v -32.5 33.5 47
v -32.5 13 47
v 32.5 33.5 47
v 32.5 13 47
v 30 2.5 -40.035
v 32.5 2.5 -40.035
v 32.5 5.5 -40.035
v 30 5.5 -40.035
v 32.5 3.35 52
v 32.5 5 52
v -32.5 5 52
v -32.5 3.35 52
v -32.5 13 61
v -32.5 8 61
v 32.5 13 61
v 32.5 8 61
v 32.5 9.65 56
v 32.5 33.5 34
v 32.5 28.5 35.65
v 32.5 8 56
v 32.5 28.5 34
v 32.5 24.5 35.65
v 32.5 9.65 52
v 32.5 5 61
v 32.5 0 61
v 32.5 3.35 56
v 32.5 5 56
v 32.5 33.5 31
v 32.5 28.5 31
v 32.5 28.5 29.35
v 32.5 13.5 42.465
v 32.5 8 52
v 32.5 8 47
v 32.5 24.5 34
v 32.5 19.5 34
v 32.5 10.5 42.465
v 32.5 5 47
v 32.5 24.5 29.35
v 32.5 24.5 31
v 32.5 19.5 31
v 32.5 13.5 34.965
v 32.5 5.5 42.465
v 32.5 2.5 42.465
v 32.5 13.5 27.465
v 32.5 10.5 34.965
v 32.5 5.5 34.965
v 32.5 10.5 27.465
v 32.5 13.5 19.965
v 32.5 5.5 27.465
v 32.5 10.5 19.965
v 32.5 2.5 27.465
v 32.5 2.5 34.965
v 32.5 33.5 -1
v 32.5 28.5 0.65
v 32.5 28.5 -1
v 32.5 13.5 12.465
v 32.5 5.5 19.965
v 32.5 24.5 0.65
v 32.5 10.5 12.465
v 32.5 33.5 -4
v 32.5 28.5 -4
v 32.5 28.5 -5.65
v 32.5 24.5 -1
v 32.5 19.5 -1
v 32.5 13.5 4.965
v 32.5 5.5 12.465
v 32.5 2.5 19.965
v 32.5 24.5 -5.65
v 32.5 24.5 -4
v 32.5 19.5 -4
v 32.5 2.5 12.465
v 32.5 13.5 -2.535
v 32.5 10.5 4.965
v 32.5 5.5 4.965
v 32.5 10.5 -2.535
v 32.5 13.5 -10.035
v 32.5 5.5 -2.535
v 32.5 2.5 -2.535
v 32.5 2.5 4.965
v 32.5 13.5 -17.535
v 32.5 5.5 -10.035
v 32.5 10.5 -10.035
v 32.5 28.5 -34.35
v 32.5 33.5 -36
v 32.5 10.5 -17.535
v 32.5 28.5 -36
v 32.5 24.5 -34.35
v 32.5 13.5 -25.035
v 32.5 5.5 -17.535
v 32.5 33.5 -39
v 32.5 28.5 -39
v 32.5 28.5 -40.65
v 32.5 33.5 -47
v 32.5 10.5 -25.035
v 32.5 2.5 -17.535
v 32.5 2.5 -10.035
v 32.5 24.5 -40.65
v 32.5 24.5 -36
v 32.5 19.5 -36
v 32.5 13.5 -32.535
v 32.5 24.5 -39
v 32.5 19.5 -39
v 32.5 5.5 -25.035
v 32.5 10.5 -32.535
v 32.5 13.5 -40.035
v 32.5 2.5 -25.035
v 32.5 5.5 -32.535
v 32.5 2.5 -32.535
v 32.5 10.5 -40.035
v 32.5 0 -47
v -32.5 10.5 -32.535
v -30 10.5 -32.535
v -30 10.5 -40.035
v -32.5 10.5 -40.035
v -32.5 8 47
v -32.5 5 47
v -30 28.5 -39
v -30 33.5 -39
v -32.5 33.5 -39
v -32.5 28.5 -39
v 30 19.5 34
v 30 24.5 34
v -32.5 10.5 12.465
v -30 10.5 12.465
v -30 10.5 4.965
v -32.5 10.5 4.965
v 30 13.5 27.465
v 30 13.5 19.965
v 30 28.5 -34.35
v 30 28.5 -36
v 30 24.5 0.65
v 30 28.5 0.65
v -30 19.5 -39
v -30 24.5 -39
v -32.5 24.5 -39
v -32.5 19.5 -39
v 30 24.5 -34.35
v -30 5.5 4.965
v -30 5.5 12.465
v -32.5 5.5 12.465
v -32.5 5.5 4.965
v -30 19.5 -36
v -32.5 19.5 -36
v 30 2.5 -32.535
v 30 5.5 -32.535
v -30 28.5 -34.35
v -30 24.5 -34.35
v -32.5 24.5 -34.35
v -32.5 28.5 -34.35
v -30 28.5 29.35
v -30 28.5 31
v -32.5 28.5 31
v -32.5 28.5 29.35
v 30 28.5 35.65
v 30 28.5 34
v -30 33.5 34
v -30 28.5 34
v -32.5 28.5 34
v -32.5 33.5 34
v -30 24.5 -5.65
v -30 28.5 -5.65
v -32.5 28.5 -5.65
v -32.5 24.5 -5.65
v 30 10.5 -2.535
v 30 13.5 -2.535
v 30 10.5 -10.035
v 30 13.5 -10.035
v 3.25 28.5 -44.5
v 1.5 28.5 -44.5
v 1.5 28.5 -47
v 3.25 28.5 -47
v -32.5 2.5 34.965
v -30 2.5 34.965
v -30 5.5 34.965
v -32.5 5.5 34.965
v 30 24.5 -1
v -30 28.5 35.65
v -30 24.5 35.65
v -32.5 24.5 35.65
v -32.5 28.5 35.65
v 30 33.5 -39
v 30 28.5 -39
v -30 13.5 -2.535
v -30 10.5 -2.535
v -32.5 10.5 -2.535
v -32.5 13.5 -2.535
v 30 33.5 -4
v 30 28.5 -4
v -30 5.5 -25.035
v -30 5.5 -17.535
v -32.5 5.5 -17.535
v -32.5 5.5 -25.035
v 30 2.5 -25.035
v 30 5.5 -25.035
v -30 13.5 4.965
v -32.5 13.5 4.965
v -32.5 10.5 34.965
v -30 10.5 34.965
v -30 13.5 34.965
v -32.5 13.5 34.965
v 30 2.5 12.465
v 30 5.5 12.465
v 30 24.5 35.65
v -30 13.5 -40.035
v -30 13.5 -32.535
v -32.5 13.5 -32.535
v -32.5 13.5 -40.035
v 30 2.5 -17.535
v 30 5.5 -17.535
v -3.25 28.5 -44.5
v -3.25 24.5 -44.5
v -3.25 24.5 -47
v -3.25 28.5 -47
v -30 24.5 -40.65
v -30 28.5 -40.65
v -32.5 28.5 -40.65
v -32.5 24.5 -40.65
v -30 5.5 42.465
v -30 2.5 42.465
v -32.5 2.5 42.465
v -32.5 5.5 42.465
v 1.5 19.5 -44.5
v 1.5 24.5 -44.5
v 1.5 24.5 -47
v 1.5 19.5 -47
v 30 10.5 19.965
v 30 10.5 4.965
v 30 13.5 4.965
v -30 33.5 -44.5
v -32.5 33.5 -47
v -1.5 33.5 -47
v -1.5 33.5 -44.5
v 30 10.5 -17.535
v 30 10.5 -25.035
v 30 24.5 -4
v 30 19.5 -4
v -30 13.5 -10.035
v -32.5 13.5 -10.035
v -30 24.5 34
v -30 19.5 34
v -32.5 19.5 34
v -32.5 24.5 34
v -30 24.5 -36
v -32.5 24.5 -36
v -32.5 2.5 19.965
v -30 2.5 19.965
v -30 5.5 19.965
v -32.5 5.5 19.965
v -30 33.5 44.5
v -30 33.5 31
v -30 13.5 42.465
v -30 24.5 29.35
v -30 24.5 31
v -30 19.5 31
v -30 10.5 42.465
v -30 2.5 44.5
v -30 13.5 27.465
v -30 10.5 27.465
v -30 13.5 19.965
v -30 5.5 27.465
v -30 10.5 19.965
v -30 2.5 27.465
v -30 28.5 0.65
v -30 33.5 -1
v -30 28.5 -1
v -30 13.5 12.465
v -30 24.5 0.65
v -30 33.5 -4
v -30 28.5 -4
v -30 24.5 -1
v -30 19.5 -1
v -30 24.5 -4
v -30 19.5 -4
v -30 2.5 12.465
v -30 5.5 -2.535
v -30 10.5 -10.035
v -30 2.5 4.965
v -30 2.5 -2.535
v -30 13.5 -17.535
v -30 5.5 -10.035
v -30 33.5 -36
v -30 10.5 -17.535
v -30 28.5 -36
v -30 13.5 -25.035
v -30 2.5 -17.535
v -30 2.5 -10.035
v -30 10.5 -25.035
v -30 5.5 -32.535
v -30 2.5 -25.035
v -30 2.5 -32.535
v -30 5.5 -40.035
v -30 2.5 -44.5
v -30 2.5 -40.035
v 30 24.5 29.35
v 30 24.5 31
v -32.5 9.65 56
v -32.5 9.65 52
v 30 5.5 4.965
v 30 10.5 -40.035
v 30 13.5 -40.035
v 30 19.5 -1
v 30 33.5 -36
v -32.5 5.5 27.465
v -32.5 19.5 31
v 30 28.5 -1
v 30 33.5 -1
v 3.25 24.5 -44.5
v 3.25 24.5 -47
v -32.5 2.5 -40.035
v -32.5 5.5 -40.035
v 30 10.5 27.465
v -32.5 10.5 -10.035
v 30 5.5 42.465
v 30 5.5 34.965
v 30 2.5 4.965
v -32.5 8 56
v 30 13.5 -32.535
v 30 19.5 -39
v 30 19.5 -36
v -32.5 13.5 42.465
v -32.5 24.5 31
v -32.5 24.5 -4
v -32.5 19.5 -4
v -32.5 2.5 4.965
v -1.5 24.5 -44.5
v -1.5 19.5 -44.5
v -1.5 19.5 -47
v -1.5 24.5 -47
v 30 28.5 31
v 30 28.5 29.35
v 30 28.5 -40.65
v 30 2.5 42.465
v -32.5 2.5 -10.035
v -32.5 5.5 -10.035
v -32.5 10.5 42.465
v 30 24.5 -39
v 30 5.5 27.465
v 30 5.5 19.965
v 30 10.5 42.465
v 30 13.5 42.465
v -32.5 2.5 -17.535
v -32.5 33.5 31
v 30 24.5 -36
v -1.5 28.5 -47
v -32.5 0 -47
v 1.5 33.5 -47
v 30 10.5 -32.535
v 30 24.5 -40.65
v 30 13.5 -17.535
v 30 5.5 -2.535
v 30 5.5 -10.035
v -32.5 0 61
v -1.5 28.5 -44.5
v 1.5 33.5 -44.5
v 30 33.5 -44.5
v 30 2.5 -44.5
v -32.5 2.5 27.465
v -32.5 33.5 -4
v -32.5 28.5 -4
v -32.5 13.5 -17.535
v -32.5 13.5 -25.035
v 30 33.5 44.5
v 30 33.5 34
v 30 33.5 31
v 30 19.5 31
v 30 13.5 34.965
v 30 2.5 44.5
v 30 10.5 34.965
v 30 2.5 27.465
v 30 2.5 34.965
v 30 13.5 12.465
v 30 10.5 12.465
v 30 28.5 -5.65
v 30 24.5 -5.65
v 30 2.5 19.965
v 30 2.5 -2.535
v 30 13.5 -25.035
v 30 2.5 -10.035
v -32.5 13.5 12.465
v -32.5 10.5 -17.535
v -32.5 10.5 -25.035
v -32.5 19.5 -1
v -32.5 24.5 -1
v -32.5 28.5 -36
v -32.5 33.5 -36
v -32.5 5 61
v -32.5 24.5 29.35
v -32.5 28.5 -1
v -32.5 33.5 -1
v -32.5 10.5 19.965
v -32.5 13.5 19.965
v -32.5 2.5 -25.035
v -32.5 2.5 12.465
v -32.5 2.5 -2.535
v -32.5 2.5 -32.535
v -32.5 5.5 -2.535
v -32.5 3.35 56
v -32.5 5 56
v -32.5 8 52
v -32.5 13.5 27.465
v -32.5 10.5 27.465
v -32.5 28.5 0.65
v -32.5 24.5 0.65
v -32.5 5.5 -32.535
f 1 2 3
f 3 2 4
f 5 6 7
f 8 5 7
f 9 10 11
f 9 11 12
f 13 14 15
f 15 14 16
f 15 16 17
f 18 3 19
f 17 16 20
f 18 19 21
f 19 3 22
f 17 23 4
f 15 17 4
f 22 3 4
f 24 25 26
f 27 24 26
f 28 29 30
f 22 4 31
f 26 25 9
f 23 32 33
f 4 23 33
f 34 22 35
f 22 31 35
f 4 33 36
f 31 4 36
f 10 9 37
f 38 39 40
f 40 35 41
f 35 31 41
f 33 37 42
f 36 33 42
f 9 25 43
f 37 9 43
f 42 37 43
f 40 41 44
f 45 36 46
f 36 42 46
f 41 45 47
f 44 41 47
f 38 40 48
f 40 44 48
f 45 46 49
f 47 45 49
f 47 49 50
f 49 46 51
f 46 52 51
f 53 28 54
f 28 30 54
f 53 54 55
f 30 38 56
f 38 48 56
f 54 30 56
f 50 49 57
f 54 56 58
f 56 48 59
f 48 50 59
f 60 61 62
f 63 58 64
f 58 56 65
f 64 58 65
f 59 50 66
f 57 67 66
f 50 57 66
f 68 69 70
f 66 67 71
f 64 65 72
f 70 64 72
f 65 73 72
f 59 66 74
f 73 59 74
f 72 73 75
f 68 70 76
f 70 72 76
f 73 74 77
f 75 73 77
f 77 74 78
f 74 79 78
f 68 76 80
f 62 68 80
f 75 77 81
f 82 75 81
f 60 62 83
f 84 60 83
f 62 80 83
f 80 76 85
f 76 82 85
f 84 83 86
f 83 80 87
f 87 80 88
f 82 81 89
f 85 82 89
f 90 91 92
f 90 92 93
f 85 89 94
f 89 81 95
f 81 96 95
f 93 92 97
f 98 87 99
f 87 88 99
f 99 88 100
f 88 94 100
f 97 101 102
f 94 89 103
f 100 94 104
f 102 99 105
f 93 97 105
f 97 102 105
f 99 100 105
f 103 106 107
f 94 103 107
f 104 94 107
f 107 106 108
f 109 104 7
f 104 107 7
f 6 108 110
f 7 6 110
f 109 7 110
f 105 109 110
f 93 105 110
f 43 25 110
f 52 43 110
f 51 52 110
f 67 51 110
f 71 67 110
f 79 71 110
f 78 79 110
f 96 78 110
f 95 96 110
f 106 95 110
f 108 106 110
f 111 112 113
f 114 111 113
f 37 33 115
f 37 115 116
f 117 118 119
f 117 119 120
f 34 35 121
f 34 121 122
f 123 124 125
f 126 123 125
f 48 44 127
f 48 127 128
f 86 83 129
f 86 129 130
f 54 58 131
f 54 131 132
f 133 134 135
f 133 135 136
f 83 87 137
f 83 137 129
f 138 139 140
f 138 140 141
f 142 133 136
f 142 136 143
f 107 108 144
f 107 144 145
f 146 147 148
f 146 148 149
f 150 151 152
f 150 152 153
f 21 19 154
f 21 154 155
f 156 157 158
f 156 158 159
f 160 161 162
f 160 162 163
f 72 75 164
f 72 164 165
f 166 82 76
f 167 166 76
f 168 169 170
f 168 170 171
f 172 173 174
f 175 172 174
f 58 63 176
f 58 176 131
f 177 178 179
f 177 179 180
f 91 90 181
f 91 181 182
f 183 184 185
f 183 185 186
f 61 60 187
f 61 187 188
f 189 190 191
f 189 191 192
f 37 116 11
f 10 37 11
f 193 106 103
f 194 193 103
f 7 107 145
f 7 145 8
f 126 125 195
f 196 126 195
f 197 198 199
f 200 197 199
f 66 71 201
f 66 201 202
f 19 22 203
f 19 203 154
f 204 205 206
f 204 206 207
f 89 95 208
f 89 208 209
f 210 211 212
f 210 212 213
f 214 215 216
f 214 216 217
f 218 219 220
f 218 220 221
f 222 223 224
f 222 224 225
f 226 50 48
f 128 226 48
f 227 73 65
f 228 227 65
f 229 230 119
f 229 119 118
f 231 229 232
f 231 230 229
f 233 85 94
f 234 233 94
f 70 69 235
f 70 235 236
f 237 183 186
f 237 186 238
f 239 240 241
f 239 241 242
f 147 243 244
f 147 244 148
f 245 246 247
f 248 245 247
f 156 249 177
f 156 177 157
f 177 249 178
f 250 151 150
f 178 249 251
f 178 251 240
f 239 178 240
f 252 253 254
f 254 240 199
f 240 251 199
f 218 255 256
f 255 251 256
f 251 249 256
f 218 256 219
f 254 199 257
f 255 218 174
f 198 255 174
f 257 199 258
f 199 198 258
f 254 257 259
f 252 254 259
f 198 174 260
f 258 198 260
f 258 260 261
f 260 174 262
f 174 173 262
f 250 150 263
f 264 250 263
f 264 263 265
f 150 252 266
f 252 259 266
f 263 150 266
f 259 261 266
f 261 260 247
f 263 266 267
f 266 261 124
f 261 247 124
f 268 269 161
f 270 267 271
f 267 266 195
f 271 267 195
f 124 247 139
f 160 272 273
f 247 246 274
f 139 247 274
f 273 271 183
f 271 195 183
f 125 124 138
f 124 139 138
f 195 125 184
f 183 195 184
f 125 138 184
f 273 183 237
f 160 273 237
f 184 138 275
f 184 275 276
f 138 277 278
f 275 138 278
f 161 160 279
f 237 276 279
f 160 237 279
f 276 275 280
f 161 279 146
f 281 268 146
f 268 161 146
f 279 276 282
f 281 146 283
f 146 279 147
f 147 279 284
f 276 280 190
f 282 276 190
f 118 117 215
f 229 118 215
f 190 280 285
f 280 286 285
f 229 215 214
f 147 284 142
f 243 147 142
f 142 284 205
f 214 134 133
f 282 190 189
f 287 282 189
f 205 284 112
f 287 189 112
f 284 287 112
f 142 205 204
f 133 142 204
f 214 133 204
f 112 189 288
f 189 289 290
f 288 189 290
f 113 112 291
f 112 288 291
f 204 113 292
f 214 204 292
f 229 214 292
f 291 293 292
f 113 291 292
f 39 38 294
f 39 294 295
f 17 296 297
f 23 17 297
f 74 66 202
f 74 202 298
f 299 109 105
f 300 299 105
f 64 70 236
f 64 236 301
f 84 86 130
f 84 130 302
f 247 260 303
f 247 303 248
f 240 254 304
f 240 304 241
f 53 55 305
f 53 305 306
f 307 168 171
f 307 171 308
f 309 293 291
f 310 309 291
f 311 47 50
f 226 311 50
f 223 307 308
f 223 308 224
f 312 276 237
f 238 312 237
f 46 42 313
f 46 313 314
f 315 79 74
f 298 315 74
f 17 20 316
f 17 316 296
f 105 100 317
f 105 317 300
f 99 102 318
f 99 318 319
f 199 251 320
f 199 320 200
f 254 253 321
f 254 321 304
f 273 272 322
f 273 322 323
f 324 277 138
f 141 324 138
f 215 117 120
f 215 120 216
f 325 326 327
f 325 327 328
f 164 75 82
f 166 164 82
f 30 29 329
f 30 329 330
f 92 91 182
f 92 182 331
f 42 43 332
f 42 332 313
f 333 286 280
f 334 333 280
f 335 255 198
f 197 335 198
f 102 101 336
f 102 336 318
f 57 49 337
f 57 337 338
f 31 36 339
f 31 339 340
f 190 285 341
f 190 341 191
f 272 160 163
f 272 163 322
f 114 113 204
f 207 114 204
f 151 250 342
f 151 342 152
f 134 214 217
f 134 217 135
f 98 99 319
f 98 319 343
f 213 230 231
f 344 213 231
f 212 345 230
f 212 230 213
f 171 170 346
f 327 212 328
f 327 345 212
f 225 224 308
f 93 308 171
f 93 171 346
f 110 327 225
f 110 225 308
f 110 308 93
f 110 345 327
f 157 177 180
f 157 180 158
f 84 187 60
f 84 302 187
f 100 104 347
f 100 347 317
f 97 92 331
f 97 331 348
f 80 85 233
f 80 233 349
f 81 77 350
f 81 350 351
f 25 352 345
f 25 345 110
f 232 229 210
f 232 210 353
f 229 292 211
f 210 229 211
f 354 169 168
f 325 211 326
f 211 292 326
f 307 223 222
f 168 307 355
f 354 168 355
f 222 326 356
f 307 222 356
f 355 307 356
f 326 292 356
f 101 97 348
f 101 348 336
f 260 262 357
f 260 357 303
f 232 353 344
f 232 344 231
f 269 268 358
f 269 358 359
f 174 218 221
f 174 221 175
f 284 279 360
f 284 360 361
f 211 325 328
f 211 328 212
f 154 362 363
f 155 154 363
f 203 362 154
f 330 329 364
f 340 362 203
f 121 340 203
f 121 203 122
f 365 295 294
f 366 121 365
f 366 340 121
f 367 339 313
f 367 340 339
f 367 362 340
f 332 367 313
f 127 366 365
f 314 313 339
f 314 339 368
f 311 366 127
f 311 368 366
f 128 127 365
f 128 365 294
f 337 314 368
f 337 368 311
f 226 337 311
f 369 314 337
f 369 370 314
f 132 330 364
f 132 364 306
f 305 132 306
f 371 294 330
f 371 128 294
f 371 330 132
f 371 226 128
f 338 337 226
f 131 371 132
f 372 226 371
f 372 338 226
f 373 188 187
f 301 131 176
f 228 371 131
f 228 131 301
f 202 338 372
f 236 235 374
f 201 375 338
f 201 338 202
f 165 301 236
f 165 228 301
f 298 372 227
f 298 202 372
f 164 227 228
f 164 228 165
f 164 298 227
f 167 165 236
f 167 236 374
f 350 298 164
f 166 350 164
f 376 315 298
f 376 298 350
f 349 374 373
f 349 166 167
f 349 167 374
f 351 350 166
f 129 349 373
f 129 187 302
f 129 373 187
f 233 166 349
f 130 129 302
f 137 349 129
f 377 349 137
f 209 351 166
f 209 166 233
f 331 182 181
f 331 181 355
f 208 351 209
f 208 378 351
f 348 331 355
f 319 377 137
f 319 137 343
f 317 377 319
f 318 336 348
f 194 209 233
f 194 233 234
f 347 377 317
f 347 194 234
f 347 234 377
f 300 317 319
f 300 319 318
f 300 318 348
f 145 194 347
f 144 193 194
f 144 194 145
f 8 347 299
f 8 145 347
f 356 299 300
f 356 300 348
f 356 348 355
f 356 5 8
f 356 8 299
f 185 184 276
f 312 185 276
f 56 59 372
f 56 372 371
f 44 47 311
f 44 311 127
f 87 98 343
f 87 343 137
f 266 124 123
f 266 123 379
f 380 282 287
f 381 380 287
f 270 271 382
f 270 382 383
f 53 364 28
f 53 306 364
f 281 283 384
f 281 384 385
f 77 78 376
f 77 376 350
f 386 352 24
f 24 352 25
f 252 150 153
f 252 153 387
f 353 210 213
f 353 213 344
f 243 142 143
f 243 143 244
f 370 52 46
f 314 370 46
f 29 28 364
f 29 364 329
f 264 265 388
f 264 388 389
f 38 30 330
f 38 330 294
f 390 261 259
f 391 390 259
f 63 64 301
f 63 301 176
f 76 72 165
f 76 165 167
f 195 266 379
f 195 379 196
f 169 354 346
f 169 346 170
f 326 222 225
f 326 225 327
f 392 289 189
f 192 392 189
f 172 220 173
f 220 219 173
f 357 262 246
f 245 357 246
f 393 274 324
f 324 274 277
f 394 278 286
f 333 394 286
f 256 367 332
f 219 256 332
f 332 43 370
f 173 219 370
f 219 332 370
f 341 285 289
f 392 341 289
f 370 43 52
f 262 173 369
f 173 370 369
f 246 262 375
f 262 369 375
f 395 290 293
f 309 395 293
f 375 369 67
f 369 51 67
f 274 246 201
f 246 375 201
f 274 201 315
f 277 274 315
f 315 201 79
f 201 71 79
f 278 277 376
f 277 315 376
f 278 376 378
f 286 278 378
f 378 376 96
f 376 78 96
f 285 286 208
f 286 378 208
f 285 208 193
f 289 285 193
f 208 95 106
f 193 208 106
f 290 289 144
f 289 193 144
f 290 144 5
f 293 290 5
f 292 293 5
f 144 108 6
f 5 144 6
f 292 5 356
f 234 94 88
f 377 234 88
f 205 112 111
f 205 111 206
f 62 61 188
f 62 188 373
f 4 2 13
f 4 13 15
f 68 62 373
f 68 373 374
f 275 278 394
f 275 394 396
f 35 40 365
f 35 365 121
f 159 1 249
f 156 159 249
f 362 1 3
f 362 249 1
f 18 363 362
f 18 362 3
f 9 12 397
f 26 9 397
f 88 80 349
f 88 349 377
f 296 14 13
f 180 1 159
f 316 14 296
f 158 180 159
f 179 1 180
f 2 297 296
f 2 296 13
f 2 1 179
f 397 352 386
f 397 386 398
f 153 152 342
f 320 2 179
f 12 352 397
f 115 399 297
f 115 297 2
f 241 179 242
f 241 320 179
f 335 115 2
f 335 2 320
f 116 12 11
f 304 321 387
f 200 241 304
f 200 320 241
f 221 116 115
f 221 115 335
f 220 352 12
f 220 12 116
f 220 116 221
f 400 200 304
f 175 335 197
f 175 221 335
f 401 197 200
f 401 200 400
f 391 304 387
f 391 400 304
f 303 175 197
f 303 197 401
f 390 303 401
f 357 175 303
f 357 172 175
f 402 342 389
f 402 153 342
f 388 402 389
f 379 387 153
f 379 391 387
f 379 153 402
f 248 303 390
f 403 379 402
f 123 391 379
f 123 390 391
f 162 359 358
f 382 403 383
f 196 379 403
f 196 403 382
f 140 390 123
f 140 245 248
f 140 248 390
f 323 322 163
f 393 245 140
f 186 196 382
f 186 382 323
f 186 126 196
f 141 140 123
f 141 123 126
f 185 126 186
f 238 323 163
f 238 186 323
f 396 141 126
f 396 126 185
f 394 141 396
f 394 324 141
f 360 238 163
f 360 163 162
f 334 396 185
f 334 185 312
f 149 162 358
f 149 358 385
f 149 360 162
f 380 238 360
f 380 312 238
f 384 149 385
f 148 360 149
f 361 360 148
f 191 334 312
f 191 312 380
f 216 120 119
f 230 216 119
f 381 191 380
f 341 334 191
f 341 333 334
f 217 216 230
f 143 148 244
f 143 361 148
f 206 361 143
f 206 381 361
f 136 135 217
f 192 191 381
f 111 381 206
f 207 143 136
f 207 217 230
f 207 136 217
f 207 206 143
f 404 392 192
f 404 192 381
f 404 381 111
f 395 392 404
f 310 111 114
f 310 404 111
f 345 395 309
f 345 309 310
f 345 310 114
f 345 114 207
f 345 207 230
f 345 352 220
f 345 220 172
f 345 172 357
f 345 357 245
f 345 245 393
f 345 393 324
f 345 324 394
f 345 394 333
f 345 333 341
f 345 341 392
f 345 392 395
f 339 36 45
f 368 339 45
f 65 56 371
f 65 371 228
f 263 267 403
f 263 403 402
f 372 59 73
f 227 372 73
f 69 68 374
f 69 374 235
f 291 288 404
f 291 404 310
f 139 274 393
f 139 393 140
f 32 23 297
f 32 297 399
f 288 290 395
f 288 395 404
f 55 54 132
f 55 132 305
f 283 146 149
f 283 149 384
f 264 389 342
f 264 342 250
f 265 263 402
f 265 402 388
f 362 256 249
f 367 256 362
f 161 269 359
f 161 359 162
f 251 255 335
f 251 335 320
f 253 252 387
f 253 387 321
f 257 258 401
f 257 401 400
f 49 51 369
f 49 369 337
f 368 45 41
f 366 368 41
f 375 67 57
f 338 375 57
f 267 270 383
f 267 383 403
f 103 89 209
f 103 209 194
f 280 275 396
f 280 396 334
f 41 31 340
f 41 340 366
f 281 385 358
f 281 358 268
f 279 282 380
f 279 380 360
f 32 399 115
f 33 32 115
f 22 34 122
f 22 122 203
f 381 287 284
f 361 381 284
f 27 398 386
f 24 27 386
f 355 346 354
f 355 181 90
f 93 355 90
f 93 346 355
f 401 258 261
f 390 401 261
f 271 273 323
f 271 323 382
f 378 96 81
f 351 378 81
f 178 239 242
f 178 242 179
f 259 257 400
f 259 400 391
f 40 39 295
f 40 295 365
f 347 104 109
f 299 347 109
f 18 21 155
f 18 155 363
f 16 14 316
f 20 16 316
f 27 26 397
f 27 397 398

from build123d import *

# Parameters (mm, degrees)
SKETCH1_W                 = 60
SKETCH1_H                 = 89
BOSS_EXTRUDE1_DEPTH       = 2.5
SKETCH3_W                 = 65
SKETCH3_H                 = 94
SKETCH3_W_2               = 60
SKETCH3_H_2               = 89
BOSS_EXTRUDE2_DEPTH       = 33.5
SKETCH5_W                 = 7.5
SKETCH5_H                 = 3
CUT_EXTRUDE1_DEPTH        = 33.5
LPATTERN1_COUNT           = 6
LPATTERN1_PITCH           = 15
LPATTERN2_COUNT           = 2
LPATTERN2_PITCH           = 8
LPATTERN2_COPY_1_SKETCH_W = 7.5
LPATTERN2_COPY_1_SKETCH_H = 3
LPATTERN2_COPY_1_DEPTH    = 33.5
LPATTERN2_COPY_2_SKETCH_W = 7.5
LPATTERN2_COPY_2_SKETCH_H = 3
LPATTERN2_COPY_2_DEPTH    = 33.5
LPATTERN2_COPY_3_SKETCH_W = 7.5
LPATTERN2_COPY_3_SKETCH_H = 3
LPATTERN2_COPY_3_DEPTH    = 33.5
LPATTERN2_COPY_4_SKETCH_W = 7.5
LPATTERN2_COPY_4_SKETCH_H = 3
LPATTERN2_COPY_4_DEPTH    = 33.5
LPATTERN2_COPY_5_SKETCH_W = 7.5
LPATTERN2_COPY_5_SKETCH_H = 3
LPATTERN2_COPY_5_DEPTH    = 33.5
SKETCH6_W                 = 65
SKETCH6_H                 = 14
BOSS_EXTRUDE3_DEPTH       = 13
CUT_EXTRUDE2_DEPTH        = 33.5
CUT_EXTRUDE2_DEPTH_BACK   = 33.5
CUT_EXTRUDE3_DEPTH        = 33.5
LPATTERN3_COUNT           = 3
LPATTERN3_PITCH           = 35
CUT_EXTRUDE4_REACH        = 49


with BuildPart() as part:
    # Sketch1 → Boss-Extrude1 (new body)
    with BuildSketch(Plane(origin=(0, 0, 0), x_dir=(1, 0, 0), z_dir=(0, 1, 0))):
        Rectangle(SKETCH1_W, SKETCH1_H)
    extrude(amount=BOSS_EXTRUDE1_DEPTH)

    # Sketch3 → Boss-Extrude2 (add)
    with BuildSketch(Plane(origin=(0, 0, 0), x_dir=(1, 0, 0), z_dir=(0, 1, 0))):
        Rectangle(SKETCH3_W, SKETCH3_H)
        Rectangle(SKETCH3_W_2, SKETCH3_H_2, mode=Mode.SUBTRACT)
    extrude(amount=BOSS_EXTRUDE2_DEPTH)

    # Sketch5 → Cut-Extrude1 (cut, symmetric)
    with BuildSketch(Plane(origin=(0, 0, 0), x_dir=(0, 0, -1), z_dir=(1, 0, 0))):
        with Locations((-38.715113754, 4)):
            Rectangle(SKETCH5_W, SKETCH5_H)
    cut_extrude1 = extrude(amount=CUT_EXTRUDE1_DEPTH, both=True, mode=Mode.SUBTRACT)

    # LPattern1: Cut-Extrude1 ×6
    with Locations(*[(0, 0, -i * LPATTERN1_PITCH) for i in range(1, LPATTERN1_COUNT)]):
        add(cut_extrude1, mode=Mode.SUBTRACT)

    # LPattern2: Cut-Extrude1 ×2
    with Locations(*[(0, i * LPATTERN2_PITCH, 0) for i in range(1, LPATTERN2_COUNT)]):
        add(cut_extrude1, mode=Mode.SUBTRACT)

    # LPattern2 copy 1 sketch → LPattern2 copy 1 (cut, symmetric)
    with BuildSketch(Plane(origin=(0, 8, -15), x_dir=(0, 0, -1), z_dir=(1, 0, 0))):
        with Locations((-38.715113754, 4)):
            Rectangle(LPATTERN2_COPY_1_SKETCH_W, LPATTERN2_COPY_1_SKETCH_H)
    extrude(amount=LPATTERN2_COPY_1_DEPTH, both=True, mode=Mode.SUBTRACT)

    # LPattern2 copy 2 sketch → LPattern2 copy 2 (cut, symmetric)
    with BuildSketch(Plane(origin=(0, 8, -30), x_dir=(0, 0, -1), z_dir=(1, 0, 0))):
        with Locations((-38.715113754, 4)):
            Rectangle(LPATTERN2_COPY_2_SKETCH_W, LPATTERN2_COPY_2_SKETCH_H)
    extrude(amount=LPATTERN2_COPY_2_DEPTH, both=True, mode=Mode.SUBTRACT)

    # LPattern2 copy 3 sketch → LPattern2 copy 3 (cut, symmetric)
    with BuildSketch(Plane(origin=(0, 8, -45), x_dir=(0, 0, -1), z_dir=(1, 0, 0))):
        with Locations((-38.715113754, 4)):
            Rectangle(LPATTERN2_COPY_3_SKETCH_W, LPATTERN2_COPY_3_SKETCH_H)
    extrude(amount=LPATTERN2_COPY_3_DEPTH, both=True, mode=Mode.SUBTRACT)

    # LPattern2 copy 4 sketch → LPattern2 copy 4 (cut, symmetric)
    with BuildSketch(Plane(origin=(0, 8, -60), x_dir=(0, 0, -1), z_dir=(1, 0, 0))):
        with Locations((-38.715113754, 4)):
            Rectangle(LPATTERN2_COPY_4_SKETCH_W, LPATTERN2_COPY_4_SKETCH_H)
    extrude(amount=LPATTERN2_COPY_4_DEPTH, both=True, mode=Mode.SUBTRACT)

    # LPattern2 copy 5 sketch → LPattern2 copy 5 (cut, symmetric)
    with BuildSketch(Plane(origin=(0, 8, -75), x_dir=(0, 0, -1), z_dir=(1, 0, 0))):
        with Locations((-38.715113754, 4)):
            Rectangle(LPATTERN2_COPY_5_SKETCH_W, LPATTERN2_COPY_5_SKETCH_H)
    extrude(amount=LPATTERN2_COPY_5_DEPTH, both=True, mode=Mode.SUBTRACT)

    # Sketch6 → Boss-Extrude3 (add)
    with BuildSketch(Plane(origin=(0, 0, 0), x_dir=(1, 0, 0), z_dir=(0, 1, 0))):
        with Locations((0, -54)):
            Rectangle(SKETCH6_W, SKETCH6_H)
    extrude(amount=BOSS_EXTRUDE3_DEPTH)

    # Sketch7 → Cut-Extrude2 (cut, two sides)
    with BuildSketch(Plane(origin=(0, 0, 0), x_dir=(0, 0, -1), z_dir=(1, 0, 0))) as cut_extrude2_sk:
        Polygon((-61, 8), (-56, 8), (-56, 9.65), (-52, 9.65), (-52, 8), (-47, 8), (-47, 5), (-52, 5), (-52, 3.35), (-56, 3.35), (-56, 5), (-61, 5), align=None)
    extrude(amount=CUT_EXTRUDE2_DEPTH, mode=Mode.SUBTRACT)
    extrude(cut_extrude2_sk.sketch, amount=-CUT_EXTRUDE2_DEPTH_BACK, mode=Mode.SUBTRACT)

    # Sketch11 → Cut-Extrude3 (cut, symmetric)
    with BuildSketch(Plane(origin=(0, 0, 0), x_dir=(0, 0, -1), z_dir=(1, 0, 0))):
        Polygon((39, 33.5), (39, 28.5), (40.65, 28.5), (40.65, 24.5), (39, 24.5), (39, 19.5), (36, 19.5), (36, 24.5), (34.35, 24.5), (34.35, 28.5), (36, 28.5), (36, 33.5), align=None)
    cut_extrude3 = extrude(amount=CUT_EXTRUDE3_DEPTH, both=True, mode=Mode.SUBTRACT)

    # LPattern3: Cut-Extrude3 ×3
    with Locations(*[(0, 0, i * LPATTERN3_PITCH) for i in range(1, LPATTERN3_COUNT)]):
        add(cut_extrude3, mode=Mode.SUBTRACT)

    # Sketch12 → Cut-Extrude4 (cut, up to next)
    with BuildSketch(Plane.XY, mode=Mode.PRIVATE) as cut_extrude4_sk1:
        Polygon((1.5, 33.5), (1.5, 28.5), (3.25, 28.5), (3.25, 24.5), (1.5, 24.5), (1.5, 19.5), (-1.5, 19.5), (-1.5, 24.5), (-3.25, 24.5), (-3.25, 28.5), (-1.5, 28.5), (-1.5, 33.5), align=None)
    cut_extrude4_tool1 = extrude(cut_extrude4_sk1.sketch, amount=-CUT_EXTRUDE4_REACH, mode=Mode.PRIVATE) & part.part
    add(cut_extrude4_tool1.solids().sort_by_distance((0, 26.5, 0))[0], mode=Mode.SUBTRACT)


solid = part.part
